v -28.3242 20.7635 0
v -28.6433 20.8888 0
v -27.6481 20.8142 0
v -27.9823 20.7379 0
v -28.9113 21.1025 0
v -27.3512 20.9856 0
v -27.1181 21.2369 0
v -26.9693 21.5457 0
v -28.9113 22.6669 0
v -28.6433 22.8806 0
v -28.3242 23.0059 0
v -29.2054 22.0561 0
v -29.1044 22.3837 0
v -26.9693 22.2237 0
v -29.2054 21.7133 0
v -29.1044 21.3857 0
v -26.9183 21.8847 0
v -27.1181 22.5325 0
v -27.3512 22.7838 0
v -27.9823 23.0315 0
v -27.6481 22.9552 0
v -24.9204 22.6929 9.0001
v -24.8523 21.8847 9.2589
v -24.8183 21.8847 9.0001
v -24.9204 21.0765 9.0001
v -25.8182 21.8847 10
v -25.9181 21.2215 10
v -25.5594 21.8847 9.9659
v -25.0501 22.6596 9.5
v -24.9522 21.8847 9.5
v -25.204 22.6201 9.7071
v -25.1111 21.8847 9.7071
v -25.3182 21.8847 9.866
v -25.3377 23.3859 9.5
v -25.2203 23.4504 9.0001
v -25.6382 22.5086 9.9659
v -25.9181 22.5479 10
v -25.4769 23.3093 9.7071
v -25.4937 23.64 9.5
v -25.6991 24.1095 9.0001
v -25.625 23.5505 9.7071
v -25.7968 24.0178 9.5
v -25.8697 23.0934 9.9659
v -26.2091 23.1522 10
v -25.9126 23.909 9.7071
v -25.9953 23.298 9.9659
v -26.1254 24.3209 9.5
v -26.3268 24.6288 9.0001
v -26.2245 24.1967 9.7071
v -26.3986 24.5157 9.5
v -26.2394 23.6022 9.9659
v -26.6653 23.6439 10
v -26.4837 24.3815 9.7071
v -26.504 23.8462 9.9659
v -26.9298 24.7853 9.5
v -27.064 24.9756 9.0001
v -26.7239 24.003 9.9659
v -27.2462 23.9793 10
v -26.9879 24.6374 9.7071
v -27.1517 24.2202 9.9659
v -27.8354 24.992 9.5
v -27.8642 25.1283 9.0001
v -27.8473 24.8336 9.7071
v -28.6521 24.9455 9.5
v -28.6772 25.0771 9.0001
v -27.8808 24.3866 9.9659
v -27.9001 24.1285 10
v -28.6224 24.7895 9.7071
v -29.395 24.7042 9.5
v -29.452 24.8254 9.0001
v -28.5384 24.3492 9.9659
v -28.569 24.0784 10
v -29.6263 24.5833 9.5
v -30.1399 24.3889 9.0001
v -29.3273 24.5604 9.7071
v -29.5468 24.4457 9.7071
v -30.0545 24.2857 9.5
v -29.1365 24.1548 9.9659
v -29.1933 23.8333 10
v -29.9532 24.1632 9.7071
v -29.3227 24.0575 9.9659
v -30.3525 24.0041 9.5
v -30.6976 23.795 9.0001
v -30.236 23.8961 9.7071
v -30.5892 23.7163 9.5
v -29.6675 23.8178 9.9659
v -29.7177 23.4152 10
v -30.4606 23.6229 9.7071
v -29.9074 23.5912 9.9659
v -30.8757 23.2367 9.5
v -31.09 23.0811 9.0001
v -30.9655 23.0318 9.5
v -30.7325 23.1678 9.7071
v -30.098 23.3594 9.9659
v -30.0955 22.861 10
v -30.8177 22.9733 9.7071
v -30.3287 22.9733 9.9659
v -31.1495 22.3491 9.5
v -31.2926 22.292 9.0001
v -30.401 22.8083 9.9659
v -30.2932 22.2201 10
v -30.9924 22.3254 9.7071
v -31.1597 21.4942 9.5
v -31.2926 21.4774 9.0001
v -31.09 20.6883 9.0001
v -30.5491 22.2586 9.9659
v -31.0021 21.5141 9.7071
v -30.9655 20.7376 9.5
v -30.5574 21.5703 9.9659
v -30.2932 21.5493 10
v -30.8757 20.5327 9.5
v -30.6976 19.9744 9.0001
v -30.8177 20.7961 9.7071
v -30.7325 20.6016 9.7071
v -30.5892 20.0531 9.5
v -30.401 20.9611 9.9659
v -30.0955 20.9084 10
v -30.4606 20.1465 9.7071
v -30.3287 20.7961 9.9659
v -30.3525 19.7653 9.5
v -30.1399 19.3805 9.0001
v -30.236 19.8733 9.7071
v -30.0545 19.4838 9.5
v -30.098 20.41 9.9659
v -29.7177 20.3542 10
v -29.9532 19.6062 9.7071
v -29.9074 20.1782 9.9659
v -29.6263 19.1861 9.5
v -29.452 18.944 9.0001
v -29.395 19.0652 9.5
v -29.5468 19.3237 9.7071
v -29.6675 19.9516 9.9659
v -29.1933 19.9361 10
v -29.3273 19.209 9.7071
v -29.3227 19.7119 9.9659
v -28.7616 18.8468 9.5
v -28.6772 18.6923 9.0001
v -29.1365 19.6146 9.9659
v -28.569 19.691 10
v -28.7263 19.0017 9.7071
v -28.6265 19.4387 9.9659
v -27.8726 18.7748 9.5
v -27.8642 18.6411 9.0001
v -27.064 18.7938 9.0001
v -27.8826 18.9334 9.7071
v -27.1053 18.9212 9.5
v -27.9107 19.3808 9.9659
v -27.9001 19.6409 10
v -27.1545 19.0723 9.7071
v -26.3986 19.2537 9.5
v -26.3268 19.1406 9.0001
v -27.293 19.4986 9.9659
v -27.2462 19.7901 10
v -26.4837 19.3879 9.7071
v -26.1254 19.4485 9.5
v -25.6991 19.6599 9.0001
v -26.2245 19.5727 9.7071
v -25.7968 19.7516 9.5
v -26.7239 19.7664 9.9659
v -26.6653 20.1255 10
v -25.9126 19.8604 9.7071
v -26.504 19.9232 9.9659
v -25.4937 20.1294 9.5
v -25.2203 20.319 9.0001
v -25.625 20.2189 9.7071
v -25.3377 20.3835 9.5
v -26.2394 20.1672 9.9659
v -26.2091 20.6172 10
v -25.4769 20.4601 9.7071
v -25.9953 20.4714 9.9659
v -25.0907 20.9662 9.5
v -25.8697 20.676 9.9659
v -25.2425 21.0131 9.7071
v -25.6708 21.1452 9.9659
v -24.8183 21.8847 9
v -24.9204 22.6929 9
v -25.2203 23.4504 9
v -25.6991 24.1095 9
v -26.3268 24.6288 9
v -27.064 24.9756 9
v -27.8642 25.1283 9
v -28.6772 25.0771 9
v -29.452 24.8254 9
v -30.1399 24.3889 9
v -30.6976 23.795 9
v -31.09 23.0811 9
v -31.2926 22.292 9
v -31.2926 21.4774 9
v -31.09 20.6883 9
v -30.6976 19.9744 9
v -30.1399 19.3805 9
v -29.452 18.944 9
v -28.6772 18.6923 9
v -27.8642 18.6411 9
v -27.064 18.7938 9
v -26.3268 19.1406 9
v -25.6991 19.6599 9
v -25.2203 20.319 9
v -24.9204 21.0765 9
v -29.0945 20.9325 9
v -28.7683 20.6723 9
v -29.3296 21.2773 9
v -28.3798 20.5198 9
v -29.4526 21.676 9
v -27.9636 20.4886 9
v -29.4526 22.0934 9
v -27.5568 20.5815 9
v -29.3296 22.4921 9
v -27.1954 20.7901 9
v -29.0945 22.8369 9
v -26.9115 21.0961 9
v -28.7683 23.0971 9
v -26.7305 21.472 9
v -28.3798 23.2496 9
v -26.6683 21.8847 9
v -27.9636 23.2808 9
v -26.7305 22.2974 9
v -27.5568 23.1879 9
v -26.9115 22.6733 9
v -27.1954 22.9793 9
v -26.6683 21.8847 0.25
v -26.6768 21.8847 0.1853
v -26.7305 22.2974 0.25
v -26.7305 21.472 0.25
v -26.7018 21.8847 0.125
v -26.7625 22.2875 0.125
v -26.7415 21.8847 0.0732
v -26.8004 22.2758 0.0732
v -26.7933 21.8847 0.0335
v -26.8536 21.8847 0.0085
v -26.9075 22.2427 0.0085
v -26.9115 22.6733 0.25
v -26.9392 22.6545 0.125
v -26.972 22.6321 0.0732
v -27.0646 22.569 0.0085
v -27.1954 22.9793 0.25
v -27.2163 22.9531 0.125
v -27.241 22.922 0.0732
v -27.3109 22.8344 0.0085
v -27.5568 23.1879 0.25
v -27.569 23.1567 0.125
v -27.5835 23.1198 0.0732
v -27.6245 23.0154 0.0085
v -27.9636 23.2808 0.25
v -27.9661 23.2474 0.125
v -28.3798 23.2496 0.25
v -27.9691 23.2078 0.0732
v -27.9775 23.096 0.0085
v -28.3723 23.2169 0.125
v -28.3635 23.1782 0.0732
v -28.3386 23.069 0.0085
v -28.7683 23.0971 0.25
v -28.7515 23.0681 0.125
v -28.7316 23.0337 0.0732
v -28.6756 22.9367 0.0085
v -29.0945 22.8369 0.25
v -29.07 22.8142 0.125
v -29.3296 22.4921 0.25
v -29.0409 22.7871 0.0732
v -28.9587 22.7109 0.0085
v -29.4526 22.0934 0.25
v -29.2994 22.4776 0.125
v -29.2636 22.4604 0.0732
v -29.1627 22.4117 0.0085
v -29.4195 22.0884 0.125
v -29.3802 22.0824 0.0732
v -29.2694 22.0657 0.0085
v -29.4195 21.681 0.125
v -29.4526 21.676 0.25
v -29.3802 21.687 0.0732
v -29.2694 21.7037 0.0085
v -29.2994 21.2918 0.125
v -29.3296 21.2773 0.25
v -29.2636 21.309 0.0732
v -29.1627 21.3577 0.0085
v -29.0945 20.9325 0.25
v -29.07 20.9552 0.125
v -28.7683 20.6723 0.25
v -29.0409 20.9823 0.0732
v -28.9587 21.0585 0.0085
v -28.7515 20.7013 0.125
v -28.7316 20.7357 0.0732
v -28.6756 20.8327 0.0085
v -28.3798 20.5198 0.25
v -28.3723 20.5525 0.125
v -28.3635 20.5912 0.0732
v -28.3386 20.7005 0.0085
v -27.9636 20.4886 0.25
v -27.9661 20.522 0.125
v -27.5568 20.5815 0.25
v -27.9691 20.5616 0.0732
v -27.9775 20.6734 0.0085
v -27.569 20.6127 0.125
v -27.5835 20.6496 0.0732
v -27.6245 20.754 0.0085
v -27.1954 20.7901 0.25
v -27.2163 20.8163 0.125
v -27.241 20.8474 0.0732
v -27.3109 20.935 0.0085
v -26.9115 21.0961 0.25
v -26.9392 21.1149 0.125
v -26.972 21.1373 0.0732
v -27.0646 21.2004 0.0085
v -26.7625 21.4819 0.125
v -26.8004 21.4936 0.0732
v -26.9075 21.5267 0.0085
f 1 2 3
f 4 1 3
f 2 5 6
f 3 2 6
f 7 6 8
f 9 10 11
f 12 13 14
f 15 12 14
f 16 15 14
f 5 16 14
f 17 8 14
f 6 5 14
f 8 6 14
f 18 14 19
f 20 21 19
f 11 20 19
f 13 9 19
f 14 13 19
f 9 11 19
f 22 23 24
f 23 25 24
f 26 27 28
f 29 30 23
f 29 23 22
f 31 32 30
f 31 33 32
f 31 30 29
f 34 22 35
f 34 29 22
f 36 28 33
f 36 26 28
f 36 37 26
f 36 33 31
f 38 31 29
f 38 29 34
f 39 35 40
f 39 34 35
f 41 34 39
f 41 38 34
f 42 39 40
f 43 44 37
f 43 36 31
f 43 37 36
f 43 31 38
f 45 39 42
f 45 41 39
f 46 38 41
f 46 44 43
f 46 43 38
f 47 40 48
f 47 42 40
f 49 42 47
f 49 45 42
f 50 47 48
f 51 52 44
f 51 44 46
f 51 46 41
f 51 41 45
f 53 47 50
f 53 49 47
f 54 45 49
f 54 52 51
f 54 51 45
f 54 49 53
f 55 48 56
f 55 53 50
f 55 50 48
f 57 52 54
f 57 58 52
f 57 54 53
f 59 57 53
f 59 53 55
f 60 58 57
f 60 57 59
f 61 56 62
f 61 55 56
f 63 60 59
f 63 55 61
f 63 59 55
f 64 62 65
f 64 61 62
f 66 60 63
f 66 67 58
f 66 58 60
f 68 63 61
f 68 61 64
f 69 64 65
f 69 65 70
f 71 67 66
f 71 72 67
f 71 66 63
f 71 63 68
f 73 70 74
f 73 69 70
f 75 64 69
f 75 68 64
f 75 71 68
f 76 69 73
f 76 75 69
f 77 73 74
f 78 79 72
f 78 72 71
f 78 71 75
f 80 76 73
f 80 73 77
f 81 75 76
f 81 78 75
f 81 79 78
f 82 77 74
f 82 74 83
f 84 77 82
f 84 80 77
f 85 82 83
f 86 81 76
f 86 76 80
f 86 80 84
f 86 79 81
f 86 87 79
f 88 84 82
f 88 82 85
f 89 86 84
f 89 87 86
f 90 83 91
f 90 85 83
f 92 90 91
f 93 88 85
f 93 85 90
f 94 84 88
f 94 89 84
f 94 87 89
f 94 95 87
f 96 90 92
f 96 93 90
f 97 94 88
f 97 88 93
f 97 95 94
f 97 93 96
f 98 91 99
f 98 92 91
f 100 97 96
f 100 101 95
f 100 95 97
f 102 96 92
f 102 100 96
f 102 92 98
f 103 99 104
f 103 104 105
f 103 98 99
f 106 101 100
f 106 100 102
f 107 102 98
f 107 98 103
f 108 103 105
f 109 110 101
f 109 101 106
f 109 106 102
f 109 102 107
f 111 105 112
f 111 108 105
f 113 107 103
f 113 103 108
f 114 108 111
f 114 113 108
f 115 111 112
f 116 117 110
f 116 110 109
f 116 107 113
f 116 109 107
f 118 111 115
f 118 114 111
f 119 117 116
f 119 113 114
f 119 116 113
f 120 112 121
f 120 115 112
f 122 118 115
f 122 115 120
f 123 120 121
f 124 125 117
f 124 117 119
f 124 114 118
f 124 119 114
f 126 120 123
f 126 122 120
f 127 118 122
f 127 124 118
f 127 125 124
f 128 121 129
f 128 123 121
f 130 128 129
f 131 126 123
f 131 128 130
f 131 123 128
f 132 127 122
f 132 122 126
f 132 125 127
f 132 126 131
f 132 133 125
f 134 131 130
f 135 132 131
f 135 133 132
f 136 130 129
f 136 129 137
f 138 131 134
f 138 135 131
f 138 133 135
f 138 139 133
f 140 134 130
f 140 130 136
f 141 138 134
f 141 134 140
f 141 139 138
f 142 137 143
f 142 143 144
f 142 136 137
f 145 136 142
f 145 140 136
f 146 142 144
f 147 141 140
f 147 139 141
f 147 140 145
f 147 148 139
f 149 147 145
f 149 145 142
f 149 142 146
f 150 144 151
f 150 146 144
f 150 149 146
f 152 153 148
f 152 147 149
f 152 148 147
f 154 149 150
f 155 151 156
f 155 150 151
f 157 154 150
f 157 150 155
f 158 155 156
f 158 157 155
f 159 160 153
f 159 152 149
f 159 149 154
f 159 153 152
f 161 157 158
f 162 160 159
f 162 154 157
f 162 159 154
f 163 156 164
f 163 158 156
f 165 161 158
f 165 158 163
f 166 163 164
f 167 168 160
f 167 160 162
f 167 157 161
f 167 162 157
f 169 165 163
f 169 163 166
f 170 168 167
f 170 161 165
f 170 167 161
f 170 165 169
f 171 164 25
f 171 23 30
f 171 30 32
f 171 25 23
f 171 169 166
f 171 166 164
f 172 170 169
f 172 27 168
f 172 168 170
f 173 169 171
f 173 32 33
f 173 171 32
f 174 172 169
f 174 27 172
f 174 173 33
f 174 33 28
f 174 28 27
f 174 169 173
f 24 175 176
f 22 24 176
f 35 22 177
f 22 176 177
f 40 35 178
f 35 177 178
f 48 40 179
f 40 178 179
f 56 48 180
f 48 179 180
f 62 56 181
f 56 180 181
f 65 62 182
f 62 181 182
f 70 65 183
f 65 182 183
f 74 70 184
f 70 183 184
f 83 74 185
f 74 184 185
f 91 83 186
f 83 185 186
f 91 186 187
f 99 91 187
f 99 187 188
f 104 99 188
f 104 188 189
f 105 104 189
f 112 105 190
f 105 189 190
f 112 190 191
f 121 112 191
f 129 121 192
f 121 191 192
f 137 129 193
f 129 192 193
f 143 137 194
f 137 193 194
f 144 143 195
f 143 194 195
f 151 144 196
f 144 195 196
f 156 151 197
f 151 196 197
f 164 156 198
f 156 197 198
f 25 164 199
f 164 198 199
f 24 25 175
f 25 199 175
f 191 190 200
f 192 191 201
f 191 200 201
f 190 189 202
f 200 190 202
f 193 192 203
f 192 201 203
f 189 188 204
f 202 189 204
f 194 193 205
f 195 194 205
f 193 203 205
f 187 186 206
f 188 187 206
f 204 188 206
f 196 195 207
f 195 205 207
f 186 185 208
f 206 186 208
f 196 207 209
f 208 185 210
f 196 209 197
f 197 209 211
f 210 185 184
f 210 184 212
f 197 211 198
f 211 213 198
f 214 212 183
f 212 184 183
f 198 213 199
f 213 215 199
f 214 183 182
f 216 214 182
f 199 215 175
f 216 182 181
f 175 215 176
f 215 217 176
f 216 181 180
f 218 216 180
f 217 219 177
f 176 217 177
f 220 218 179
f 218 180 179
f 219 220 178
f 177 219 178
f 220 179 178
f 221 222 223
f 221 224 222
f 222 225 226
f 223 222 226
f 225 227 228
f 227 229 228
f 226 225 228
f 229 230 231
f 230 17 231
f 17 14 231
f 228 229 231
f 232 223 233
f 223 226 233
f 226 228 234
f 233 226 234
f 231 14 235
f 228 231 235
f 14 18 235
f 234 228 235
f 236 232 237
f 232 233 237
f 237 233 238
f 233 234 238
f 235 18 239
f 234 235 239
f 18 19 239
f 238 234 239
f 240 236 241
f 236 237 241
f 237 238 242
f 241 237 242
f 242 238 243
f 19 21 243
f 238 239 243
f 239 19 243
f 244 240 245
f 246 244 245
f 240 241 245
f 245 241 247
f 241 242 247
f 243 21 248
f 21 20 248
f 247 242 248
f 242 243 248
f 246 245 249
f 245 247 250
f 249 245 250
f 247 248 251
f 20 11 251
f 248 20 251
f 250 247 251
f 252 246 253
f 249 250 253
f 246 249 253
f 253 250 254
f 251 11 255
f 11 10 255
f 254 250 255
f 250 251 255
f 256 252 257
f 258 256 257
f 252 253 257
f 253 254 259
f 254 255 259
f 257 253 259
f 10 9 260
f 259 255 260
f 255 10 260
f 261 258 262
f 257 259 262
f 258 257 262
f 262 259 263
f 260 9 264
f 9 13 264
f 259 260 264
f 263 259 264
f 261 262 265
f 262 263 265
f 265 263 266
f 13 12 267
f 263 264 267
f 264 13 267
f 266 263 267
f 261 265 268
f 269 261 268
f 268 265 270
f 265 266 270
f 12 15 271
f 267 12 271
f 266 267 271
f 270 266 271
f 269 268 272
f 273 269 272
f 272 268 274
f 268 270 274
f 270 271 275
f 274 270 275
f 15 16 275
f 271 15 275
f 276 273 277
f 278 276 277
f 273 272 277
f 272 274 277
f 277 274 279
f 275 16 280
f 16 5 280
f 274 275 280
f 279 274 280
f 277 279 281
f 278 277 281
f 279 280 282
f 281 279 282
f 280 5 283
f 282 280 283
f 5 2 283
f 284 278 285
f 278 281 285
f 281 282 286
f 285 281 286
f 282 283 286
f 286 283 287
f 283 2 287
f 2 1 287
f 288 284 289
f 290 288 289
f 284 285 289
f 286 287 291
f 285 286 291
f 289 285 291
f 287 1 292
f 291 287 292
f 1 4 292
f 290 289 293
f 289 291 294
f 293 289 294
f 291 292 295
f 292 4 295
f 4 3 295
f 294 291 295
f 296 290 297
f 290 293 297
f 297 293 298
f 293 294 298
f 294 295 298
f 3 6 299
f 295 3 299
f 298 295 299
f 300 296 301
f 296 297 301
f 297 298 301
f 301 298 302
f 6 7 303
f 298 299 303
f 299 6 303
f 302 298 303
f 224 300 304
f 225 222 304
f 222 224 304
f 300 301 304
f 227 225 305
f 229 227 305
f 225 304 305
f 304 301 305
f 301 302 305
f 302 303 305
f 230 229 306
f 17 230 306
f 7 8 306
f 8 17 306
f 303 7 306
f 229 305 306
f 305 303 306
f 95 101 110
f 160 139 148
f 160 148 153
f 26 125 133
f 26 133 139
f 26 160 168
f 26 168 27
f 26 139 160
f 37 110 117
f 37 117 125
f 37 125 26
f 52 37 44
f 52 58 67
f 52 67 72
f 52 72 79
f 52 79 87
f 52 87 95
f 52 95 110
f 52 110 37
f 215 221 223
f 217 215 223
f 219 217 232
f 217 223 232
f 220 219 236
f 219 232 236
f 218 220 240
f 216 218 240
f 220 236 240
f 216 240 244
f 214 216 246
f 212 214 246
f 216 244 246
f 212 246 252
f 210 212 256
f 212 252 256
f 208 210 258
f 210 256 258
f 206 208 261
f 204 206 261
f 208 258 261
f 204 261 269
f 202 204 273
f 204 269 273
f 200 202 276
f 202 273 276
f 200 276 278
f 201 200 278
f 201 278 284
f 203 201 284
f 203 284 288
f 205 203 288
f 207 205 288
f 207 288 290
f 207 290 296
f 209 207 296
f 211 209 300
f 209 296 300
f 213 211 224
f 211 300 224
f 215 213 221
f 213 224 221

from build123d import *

# Parameters (mm, degrees)
ESQUISSE1_R        = 1.4
BOSS_EXTRU_1_DEPTH = 9
ESQUISSE2_R        = 3.25
BOSS_EXTRU_2_DEPTH = 1
CONG_1_R           = 1
CONG_2_R           = 0.25


with BuildPart() as part:
    # Esquisse1 → Boss.-Extru.1 (new body)
    with BuildSketch(Plane.XY):
        with Locations((-28.068256791, 21.884700983)):
            Circle(ESQUISSE1_R)
    extrude(amount=BOSS_EXTRU_1_DEPTH)

    # Esquisse2 → Boss.-Extru.2 (add)
    with BuildSketch(Plane.XY.offset(9)):
        with Locations((-28.068256791, 21.884700983)):
            Circle(ESQUISSE2_R)
    extrude(amount=BOSS_EXTRU_2_DEPTH)

    # Congé1
    cong_1_edges = [part.edges().sort_by_distance(p)[0] for p in [
        (-31.318256791, 21.884700983, 10),
    ]]
    fillet(cong_1_edges, radius=CONG_1_R - 0.0001)  # a hair under: the kernel refuses the full size

    # Congé2
    cong_2_edges = [part.edges().sort_by_distance(p)[0] for p in [
        (-29.468256791, 21.884700983, 0),
    ]]
    fillet(cong_2_edges, radius=CONG_2_R)


solid = part.part
